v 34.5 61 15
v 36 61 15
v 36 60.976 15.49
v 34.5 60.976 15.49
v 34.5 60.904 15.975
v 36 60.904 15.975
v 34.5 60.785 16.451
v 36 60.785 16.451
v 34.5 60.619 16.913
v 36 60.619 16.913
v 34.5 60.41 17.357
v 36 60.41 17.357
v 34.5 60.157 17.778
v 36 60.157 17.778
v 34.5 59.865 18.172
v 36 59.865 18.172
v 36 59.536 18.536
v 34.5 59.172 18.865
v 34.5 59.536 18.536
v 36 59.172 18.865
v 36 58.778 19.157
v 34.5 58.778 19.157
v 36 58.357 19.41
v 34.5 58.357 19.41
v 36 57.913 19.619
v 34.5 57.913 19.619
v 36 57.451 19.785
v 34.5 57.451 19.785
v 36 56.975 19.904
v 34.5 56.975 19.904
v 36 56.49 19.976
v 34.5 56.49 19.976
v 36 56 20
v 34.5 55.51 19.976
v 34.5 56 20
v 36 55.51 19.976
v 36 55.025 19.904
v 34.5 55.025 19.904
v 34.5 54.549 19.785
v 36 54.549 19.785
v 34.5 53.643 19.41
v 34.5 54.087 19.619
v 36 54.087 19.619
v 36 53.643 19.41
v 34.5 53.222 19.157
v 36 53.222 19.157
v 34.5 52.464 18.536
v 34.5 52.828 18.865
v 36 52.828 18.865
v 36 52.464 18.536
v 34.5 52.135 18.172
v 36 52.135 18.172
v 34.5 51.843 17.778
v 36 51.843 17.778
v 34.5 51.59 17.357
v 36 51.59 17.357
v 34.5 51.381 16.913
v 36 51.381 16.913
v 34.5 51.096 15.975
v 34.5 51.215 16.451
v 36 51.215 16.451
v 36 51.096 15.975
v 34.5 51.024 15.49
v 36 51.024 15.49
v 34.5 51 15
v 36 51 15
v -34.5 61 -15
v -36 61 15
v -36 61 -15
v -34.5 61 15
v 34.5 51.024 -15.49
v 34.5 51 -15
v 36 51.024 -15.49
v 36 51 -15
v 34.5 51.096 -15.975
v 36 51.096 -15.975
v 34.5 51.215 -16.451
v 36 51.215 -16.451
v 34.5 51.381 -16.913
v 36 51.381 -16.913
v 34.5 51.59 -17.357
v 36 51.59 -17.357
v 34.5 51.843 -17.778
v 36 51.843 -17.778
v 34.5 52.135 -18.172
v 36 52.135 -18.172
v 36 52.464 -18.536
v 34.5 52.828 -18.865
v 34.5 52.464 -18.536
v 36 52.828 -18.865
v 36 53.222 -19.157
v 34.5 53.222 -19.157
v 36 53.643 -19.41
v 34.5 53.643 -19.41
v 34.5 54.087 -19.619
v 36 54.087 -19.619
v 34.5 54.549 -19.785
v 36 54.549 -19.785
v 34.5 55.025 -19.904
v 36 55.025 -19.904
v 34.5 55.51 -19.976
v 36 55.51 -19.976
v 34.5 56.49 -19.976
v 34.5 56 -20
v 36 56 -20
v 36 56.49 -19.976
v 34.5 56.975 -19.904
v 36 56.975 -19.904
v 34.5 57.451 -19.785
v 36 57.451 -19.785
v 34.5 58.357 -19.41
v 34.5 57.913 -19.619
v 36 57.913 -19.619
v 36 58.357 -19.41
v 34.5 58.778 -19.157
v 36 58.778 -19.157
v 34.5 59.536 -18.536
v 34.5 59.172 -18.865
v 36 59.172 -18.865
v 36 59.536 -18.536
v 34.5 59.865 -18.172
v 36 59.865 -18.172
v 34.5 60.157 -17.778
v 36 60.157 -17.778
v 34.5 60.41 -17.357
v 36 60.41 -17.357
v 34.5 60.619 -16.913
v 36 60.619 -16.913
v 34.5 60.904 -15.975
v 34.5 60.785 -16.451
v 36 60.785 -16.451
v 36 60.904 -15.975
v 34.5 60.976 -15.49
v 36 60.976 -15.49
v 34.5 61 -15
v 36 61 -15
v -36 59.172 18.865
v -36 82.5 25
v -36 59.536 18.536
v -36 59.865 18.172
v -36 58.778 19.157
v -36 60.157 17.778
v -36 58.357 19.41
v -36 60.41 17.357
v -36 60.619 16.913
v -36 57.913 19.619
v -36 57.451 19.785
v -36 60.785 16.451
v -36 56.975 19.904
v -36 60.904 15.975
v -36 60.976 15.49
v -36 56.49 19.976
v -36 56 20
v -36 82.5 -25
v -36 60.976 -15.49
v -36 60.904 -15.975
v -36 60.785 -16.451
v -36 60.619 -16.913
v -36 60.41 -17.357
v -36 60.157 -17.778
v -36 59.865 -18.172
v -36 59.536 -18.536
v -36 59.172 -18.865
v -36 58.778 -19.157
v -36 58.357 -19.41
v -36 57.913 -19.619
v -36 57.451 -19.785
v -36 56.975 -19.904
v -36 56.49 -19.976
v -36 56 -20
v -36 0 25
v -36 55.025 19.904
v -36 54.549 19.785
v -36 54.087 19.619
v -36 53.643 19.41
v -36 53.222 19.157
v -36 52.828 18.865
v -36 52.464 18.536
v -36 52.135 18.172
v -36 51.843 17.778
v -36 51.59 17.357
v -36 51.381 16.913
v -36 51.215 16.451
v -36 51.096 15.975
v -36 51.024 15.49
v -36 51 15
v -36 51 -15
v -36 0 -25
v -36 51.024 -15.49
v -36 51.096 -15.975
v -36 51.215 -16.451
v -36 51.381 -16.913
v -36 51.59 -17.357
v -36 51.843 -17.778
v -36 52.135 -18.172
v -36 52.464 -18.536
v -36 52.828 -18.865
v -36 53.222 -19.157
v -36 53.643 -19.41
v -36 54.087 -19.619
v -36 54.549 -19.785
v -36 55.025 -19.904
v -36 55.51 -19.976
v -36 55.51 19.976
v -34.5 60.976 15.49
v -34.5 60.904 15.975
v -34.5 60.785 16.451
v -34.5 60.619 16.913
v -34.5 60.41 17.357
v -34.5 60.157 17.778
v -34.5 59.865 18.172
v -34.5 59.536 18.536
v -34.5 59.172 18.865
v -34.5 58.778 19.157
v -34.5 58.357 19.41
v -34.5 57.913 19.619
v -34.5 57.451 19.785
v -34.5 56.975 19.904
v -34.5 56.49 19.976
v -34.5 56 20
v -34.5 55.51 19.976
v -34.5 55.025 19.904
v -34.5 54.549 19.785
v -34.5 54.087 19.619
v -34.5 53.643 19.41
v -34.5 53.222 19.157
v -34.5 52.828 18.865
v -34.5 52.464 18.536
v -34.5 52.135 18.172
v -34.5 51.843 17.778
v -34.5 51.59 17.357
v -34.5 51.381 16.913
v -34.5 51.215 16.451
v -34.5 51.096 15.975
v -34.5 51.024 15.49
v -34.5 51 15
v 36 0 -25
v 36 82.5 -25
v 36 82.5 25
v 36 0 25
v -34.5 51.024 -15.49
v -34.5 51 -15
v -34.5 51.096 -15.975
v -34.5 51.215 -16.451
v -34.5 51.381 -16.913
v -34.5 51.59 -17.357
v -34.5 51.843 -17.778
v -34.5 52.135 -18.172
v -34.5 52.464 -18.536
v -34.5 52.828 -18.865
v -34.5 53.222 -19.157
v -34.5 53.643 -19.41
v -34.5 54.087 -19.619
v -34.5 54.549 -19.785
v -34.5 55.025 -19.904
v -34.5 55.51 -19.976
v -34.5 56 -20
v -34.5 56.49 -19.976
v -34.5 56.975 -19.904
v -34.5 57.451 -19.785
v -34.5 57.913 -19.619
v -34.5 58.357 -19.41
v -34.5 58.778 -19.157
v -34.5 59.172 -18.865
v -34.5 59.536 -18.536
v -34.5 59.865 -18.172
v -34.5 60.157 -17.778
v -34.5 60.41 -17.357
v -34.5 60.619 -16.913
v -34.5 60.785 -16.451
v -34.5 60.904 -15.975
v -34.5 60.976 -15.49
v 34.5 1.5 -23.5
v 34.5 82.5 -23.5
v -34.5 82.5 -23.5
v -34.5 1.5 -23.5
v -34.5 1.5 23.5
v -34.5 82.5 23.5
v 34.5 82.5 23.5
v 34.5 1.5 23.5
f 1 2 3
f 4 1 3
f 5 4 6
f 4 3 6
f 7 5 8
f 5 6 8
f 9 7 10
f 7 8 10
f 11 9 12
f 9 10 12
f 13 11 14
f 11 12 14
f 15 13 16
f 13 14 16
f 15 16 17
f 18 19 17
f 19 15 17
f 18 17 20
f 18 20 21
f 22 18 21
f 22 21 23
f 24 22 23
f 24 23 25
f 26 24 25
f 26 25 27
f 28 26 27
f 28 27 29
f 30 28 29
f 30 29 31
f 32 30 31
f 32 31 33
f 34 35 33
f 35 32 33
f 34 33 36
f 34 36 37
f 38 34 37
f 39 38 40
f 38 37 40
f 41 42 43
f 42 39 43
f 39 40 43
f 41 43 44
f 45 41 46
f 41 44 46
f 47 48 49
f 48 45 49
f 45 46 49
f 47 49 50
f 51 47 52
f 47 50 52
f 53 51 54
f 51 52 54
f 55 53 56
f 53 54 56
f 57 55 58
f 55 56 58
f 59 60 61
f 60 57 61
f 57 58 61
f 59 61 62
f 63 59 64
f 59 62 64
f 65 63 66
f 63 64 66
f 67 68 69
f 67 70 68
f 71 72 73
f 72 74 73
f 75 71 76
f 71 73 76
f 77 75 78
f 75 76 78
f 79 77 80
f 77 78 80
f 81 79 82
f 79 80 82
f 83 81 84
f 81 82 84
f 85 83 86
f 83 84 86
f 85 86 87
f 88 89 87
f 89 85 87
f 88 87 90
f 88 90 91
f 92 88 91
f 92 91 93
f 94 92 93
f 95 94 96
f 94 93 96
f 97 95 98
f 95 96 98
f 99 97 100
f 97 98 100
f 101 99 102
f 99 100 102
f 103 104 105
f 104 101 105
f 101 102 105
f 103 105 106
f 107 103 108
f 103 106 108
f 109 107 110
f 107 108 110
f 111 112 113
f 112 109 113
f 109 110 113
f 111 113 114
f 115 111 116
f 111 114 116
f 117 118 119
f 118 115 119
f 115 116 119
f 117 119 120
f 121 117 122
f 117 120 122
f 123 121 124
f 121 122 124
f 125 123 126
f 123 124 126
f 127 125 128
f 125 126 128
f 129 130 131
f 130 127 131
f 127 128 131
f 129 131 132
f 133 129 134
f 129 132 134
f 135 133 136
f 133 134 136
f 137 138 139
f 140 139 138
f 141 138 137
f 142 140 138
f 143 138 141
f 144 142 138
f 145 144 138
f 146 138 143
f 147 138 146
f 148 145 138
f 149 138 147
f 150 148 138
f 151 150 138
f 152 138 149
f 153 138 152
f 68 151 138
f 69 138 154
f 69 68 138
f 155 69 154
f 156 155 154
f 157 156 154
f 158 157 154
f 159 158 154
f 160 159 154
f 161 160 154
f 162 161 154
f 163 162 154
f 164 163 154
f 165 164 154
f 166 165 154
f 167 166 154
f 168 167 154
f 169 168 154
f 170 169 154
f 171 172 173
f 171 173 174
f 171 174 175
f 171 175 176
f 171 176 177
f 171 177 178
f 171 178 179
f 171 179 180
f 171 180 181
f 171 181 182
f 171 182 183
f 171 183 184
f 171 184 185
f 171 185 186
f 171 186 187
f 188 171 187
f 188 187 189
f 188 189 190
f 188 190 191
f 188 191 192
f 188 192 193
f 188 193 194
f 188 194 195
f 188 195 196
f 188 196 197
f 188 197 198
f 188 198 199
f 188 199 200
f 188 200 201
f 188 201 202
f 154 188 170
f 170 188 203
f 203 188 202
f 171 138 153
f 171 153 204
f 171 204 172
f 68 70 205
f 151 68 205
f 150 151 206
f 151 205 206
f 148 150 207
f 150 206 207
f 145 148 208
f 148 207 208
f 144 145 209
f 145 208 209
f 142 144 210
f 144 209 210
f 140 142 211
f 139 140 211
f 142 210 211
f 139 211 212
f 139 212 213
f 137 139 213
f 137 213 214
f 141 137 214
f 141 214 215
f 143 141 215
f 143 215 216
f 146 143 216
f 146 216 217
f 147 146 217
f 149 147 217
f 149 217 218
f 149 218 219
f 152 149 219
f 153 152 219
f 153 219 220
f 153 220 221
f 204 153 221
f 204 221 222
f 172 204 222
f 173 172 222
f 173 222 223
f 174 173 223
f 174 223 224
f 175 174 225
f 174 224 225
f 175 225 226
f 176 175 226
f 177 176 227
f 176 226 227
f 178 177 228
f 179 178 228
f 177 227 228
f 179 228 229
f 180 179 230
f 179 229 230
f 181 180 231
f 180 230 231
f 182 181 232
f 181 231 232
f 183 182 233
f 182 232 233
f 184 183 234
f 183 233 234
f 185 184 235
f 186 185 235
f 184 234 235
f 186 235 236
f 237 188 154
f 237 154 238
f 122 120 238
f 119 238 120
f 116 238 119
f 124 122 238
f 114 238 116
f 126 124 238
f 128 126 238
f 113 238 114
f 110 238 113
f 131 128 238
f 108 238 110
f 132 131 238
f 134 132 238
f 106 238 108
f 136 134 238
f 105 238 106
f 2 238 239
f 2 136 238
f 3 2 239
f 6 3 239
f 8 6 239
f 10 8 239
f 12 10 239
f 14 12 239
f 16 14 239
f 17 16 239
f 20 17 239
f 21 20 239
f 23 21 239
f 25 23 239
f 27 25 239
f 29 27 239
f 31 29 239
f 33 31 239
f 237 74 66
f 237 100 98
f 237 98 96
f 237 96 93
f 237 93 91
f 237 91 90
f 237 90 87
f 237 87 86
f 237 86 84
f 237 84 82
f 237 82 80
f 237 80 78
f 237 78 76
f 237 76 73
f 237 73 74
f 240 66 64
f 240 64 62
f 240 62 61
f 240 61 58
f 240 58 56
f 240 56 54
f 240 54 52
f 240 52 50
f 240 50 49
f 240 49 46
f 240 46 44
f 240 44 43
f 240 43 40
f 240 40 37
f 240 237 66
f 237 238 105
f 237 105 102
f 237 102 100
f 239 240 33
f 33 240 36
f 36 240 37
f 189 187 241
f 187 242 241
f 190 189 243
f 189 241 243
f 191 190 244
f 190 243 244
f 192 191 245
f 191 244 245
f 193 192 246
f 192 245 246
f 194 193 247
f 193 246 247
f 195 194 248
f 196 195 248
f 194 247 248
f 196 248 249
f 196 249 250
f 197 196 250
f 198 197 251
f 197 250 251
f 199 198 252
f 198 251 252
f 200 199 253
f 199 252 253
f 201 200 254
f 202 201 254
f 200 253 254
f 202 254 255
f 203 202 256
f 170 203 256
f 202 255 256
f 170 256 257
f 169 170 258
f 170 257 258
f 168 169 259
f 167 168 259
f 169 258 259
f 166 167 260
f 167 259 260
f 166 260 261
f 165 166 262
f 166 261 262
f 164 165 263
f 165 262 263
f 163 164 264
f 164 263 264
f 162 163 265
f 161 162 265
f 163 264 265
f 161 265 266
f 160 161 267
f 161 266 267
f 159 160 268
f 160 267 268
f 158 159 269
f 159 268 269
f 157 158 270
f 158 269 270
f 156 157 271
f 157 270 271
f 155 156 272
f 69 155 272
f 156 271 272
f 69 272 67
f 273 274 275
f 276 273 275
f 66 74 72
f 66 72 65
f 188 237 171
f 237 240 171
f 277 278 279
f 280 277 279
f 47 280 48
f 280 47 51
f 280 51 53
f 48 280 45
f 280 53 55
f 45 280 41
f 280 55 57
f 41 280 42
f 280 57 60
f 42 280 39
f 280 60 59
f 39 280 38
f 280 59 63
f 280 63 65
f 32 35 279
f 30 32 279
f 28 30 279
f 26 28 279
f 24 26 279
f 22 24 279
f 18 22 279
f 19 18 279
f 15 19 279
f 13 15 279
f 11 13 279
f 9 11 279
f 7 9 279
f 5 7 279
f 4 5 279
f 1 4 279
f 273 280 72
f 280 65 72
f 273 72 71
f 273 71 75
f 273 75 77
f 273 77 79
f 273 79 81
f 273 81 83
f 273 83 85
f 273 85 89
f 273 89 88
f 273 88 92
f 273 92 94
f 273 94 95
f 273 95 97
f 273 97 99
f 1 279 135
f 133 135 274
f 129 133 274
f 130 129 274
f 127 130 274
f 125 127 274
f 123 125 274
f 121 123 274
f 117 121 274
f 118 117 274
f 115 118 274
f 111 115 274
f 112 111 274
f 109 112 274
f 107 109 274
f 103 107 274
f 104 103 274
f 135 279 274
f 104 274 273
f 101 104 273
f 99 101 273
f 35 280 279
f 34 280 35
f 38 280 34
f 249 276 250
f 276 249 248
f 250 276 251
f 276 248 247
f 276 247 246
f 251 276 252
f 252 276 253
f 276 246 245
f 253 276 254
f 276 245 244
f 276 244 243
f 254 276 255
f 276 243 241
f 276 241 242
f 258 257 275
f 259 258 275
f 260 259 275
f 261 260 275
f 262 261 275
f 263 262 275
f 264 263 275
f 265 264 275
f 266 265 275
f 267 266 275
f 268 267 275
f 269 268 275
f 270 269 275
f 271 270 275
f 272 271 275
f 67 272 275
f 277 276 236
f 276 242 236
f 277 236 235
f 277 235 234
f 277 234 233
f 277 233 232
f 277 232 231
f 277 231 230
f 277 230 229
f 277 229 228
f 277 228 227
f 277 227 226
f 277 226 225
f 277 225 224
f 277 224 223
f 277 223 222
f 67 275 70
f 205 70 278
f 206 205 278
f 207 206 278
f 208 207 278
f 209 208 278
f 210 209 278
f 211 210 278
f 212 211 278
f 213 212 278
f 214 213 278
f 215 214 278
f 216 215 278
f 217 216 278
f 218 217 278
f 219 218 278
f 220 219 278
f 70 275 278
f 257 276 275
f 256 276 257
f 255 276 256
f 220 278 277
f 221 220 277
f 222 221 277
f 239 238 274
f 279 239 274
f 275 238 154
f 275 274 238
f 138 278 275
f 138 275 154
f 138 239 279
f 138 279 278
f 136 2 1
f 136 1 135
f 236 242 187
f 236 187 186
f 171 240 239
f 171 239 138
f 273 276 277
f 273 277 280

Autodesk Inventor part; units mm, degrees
ref_plane "YZ Plane" through (0, 0, 0) normal (1, 0, 0) x (0, 1, 0)
ref_plane "XZ Plane" through (0, 0, 0) normal (0, 1, 0) x (-1, 0, 0)
ref_plane "XY Plane" through (0, 0, 0) normal (0, 0, 1) x (1, 0, 0)
sketch "Boceto3" plane through (0, 0, 0) normal (0, 1, 0) x (-1, 0, 0)
  line L0 (36, -25) -> (-36, -25)
  line L1 (-36, -25) -> (-36, 25)
  line L2 (-36, 25) -> (36, 25)
  line L3 (36, 25) -> (36, -25)
  point P0 (0, 0)
  point P1 (36, 0)
  point P2 (0, -25)
  dimension "d8" = 72
  dimension "d9" = 50
extrude "Extrusión2" add sketch "Boceto3" along normal blind 82.5
sketch "Boceto5" plane through (0, 82.5, 0) normal (0, 1, 0) x (1, 0, 0)
  line L0 (-34.5, -23.5) -> (34.5, -23.5)
  line L1 (34.5, -23.5) -> (34.5, 23.5)
  line L2 (34.5, 23.5) -> (-34.5, 23.5)
  line L3 (-34.5, 23.5) -> (-34.5, -23.5)
  line L4 (-36, 25) -> (-36, -25) projected
  line L5 (36, 25) -> (-36, 25) projected
  line L6 (36, -25) -> (36, 25) projected
  line L7 (-36, -25) -> (36, -25) projected
  point P0 (0, 0)
  dimension "d12" = 1.5
  dimension "d13" = 1.5
  dimension "d14" = 1.5
  dimension "d15" = 1.5
extrude "Extrusión3" cut sketch "Boceto5" against normal blind 81 contours L3 L2 L1 L0
sketch "Boceto6" plane through (36, 0, 25) normal (1, 0, 0) x (0, 0, -1)
  line L0 (10, 61) -> (40, 61)
  line L1 (45, 56) -> (45, 56)
  line L2 (40, 51) -> (10, 51)
  line L3 (5, 56) -> (5, 56)
  line L4 (0, 82.5) -> (50, 82.5) projected
  arc A0 (10, 61) -> (5, 56) centre (10, 56) ccw
  arc A1 (5, 56) -> (10, 51) centre (10, 56) ccw
  arc A2 (45, 56) -> (40, 61) centre (40, 56) ccw
  arc A3 (40, 51) -> (45, 56) centre (40, 56) ccw
  point P0 (25, 0)
  point P1 (5, 61)
  point P2 (45, 51)
  point P3 (5, 51)
  point P4 (25, 61)
  point P5 (25, 82.5)
  dimension "d18" = 21.5
  dimension "d19" = 40
  dimension "d20" = 10
  dimension "d21" = 5
extrude "Extrusión4" cut sketch "Boceto6" against normal through all
properties part number "Caja2_ConOrificios"
